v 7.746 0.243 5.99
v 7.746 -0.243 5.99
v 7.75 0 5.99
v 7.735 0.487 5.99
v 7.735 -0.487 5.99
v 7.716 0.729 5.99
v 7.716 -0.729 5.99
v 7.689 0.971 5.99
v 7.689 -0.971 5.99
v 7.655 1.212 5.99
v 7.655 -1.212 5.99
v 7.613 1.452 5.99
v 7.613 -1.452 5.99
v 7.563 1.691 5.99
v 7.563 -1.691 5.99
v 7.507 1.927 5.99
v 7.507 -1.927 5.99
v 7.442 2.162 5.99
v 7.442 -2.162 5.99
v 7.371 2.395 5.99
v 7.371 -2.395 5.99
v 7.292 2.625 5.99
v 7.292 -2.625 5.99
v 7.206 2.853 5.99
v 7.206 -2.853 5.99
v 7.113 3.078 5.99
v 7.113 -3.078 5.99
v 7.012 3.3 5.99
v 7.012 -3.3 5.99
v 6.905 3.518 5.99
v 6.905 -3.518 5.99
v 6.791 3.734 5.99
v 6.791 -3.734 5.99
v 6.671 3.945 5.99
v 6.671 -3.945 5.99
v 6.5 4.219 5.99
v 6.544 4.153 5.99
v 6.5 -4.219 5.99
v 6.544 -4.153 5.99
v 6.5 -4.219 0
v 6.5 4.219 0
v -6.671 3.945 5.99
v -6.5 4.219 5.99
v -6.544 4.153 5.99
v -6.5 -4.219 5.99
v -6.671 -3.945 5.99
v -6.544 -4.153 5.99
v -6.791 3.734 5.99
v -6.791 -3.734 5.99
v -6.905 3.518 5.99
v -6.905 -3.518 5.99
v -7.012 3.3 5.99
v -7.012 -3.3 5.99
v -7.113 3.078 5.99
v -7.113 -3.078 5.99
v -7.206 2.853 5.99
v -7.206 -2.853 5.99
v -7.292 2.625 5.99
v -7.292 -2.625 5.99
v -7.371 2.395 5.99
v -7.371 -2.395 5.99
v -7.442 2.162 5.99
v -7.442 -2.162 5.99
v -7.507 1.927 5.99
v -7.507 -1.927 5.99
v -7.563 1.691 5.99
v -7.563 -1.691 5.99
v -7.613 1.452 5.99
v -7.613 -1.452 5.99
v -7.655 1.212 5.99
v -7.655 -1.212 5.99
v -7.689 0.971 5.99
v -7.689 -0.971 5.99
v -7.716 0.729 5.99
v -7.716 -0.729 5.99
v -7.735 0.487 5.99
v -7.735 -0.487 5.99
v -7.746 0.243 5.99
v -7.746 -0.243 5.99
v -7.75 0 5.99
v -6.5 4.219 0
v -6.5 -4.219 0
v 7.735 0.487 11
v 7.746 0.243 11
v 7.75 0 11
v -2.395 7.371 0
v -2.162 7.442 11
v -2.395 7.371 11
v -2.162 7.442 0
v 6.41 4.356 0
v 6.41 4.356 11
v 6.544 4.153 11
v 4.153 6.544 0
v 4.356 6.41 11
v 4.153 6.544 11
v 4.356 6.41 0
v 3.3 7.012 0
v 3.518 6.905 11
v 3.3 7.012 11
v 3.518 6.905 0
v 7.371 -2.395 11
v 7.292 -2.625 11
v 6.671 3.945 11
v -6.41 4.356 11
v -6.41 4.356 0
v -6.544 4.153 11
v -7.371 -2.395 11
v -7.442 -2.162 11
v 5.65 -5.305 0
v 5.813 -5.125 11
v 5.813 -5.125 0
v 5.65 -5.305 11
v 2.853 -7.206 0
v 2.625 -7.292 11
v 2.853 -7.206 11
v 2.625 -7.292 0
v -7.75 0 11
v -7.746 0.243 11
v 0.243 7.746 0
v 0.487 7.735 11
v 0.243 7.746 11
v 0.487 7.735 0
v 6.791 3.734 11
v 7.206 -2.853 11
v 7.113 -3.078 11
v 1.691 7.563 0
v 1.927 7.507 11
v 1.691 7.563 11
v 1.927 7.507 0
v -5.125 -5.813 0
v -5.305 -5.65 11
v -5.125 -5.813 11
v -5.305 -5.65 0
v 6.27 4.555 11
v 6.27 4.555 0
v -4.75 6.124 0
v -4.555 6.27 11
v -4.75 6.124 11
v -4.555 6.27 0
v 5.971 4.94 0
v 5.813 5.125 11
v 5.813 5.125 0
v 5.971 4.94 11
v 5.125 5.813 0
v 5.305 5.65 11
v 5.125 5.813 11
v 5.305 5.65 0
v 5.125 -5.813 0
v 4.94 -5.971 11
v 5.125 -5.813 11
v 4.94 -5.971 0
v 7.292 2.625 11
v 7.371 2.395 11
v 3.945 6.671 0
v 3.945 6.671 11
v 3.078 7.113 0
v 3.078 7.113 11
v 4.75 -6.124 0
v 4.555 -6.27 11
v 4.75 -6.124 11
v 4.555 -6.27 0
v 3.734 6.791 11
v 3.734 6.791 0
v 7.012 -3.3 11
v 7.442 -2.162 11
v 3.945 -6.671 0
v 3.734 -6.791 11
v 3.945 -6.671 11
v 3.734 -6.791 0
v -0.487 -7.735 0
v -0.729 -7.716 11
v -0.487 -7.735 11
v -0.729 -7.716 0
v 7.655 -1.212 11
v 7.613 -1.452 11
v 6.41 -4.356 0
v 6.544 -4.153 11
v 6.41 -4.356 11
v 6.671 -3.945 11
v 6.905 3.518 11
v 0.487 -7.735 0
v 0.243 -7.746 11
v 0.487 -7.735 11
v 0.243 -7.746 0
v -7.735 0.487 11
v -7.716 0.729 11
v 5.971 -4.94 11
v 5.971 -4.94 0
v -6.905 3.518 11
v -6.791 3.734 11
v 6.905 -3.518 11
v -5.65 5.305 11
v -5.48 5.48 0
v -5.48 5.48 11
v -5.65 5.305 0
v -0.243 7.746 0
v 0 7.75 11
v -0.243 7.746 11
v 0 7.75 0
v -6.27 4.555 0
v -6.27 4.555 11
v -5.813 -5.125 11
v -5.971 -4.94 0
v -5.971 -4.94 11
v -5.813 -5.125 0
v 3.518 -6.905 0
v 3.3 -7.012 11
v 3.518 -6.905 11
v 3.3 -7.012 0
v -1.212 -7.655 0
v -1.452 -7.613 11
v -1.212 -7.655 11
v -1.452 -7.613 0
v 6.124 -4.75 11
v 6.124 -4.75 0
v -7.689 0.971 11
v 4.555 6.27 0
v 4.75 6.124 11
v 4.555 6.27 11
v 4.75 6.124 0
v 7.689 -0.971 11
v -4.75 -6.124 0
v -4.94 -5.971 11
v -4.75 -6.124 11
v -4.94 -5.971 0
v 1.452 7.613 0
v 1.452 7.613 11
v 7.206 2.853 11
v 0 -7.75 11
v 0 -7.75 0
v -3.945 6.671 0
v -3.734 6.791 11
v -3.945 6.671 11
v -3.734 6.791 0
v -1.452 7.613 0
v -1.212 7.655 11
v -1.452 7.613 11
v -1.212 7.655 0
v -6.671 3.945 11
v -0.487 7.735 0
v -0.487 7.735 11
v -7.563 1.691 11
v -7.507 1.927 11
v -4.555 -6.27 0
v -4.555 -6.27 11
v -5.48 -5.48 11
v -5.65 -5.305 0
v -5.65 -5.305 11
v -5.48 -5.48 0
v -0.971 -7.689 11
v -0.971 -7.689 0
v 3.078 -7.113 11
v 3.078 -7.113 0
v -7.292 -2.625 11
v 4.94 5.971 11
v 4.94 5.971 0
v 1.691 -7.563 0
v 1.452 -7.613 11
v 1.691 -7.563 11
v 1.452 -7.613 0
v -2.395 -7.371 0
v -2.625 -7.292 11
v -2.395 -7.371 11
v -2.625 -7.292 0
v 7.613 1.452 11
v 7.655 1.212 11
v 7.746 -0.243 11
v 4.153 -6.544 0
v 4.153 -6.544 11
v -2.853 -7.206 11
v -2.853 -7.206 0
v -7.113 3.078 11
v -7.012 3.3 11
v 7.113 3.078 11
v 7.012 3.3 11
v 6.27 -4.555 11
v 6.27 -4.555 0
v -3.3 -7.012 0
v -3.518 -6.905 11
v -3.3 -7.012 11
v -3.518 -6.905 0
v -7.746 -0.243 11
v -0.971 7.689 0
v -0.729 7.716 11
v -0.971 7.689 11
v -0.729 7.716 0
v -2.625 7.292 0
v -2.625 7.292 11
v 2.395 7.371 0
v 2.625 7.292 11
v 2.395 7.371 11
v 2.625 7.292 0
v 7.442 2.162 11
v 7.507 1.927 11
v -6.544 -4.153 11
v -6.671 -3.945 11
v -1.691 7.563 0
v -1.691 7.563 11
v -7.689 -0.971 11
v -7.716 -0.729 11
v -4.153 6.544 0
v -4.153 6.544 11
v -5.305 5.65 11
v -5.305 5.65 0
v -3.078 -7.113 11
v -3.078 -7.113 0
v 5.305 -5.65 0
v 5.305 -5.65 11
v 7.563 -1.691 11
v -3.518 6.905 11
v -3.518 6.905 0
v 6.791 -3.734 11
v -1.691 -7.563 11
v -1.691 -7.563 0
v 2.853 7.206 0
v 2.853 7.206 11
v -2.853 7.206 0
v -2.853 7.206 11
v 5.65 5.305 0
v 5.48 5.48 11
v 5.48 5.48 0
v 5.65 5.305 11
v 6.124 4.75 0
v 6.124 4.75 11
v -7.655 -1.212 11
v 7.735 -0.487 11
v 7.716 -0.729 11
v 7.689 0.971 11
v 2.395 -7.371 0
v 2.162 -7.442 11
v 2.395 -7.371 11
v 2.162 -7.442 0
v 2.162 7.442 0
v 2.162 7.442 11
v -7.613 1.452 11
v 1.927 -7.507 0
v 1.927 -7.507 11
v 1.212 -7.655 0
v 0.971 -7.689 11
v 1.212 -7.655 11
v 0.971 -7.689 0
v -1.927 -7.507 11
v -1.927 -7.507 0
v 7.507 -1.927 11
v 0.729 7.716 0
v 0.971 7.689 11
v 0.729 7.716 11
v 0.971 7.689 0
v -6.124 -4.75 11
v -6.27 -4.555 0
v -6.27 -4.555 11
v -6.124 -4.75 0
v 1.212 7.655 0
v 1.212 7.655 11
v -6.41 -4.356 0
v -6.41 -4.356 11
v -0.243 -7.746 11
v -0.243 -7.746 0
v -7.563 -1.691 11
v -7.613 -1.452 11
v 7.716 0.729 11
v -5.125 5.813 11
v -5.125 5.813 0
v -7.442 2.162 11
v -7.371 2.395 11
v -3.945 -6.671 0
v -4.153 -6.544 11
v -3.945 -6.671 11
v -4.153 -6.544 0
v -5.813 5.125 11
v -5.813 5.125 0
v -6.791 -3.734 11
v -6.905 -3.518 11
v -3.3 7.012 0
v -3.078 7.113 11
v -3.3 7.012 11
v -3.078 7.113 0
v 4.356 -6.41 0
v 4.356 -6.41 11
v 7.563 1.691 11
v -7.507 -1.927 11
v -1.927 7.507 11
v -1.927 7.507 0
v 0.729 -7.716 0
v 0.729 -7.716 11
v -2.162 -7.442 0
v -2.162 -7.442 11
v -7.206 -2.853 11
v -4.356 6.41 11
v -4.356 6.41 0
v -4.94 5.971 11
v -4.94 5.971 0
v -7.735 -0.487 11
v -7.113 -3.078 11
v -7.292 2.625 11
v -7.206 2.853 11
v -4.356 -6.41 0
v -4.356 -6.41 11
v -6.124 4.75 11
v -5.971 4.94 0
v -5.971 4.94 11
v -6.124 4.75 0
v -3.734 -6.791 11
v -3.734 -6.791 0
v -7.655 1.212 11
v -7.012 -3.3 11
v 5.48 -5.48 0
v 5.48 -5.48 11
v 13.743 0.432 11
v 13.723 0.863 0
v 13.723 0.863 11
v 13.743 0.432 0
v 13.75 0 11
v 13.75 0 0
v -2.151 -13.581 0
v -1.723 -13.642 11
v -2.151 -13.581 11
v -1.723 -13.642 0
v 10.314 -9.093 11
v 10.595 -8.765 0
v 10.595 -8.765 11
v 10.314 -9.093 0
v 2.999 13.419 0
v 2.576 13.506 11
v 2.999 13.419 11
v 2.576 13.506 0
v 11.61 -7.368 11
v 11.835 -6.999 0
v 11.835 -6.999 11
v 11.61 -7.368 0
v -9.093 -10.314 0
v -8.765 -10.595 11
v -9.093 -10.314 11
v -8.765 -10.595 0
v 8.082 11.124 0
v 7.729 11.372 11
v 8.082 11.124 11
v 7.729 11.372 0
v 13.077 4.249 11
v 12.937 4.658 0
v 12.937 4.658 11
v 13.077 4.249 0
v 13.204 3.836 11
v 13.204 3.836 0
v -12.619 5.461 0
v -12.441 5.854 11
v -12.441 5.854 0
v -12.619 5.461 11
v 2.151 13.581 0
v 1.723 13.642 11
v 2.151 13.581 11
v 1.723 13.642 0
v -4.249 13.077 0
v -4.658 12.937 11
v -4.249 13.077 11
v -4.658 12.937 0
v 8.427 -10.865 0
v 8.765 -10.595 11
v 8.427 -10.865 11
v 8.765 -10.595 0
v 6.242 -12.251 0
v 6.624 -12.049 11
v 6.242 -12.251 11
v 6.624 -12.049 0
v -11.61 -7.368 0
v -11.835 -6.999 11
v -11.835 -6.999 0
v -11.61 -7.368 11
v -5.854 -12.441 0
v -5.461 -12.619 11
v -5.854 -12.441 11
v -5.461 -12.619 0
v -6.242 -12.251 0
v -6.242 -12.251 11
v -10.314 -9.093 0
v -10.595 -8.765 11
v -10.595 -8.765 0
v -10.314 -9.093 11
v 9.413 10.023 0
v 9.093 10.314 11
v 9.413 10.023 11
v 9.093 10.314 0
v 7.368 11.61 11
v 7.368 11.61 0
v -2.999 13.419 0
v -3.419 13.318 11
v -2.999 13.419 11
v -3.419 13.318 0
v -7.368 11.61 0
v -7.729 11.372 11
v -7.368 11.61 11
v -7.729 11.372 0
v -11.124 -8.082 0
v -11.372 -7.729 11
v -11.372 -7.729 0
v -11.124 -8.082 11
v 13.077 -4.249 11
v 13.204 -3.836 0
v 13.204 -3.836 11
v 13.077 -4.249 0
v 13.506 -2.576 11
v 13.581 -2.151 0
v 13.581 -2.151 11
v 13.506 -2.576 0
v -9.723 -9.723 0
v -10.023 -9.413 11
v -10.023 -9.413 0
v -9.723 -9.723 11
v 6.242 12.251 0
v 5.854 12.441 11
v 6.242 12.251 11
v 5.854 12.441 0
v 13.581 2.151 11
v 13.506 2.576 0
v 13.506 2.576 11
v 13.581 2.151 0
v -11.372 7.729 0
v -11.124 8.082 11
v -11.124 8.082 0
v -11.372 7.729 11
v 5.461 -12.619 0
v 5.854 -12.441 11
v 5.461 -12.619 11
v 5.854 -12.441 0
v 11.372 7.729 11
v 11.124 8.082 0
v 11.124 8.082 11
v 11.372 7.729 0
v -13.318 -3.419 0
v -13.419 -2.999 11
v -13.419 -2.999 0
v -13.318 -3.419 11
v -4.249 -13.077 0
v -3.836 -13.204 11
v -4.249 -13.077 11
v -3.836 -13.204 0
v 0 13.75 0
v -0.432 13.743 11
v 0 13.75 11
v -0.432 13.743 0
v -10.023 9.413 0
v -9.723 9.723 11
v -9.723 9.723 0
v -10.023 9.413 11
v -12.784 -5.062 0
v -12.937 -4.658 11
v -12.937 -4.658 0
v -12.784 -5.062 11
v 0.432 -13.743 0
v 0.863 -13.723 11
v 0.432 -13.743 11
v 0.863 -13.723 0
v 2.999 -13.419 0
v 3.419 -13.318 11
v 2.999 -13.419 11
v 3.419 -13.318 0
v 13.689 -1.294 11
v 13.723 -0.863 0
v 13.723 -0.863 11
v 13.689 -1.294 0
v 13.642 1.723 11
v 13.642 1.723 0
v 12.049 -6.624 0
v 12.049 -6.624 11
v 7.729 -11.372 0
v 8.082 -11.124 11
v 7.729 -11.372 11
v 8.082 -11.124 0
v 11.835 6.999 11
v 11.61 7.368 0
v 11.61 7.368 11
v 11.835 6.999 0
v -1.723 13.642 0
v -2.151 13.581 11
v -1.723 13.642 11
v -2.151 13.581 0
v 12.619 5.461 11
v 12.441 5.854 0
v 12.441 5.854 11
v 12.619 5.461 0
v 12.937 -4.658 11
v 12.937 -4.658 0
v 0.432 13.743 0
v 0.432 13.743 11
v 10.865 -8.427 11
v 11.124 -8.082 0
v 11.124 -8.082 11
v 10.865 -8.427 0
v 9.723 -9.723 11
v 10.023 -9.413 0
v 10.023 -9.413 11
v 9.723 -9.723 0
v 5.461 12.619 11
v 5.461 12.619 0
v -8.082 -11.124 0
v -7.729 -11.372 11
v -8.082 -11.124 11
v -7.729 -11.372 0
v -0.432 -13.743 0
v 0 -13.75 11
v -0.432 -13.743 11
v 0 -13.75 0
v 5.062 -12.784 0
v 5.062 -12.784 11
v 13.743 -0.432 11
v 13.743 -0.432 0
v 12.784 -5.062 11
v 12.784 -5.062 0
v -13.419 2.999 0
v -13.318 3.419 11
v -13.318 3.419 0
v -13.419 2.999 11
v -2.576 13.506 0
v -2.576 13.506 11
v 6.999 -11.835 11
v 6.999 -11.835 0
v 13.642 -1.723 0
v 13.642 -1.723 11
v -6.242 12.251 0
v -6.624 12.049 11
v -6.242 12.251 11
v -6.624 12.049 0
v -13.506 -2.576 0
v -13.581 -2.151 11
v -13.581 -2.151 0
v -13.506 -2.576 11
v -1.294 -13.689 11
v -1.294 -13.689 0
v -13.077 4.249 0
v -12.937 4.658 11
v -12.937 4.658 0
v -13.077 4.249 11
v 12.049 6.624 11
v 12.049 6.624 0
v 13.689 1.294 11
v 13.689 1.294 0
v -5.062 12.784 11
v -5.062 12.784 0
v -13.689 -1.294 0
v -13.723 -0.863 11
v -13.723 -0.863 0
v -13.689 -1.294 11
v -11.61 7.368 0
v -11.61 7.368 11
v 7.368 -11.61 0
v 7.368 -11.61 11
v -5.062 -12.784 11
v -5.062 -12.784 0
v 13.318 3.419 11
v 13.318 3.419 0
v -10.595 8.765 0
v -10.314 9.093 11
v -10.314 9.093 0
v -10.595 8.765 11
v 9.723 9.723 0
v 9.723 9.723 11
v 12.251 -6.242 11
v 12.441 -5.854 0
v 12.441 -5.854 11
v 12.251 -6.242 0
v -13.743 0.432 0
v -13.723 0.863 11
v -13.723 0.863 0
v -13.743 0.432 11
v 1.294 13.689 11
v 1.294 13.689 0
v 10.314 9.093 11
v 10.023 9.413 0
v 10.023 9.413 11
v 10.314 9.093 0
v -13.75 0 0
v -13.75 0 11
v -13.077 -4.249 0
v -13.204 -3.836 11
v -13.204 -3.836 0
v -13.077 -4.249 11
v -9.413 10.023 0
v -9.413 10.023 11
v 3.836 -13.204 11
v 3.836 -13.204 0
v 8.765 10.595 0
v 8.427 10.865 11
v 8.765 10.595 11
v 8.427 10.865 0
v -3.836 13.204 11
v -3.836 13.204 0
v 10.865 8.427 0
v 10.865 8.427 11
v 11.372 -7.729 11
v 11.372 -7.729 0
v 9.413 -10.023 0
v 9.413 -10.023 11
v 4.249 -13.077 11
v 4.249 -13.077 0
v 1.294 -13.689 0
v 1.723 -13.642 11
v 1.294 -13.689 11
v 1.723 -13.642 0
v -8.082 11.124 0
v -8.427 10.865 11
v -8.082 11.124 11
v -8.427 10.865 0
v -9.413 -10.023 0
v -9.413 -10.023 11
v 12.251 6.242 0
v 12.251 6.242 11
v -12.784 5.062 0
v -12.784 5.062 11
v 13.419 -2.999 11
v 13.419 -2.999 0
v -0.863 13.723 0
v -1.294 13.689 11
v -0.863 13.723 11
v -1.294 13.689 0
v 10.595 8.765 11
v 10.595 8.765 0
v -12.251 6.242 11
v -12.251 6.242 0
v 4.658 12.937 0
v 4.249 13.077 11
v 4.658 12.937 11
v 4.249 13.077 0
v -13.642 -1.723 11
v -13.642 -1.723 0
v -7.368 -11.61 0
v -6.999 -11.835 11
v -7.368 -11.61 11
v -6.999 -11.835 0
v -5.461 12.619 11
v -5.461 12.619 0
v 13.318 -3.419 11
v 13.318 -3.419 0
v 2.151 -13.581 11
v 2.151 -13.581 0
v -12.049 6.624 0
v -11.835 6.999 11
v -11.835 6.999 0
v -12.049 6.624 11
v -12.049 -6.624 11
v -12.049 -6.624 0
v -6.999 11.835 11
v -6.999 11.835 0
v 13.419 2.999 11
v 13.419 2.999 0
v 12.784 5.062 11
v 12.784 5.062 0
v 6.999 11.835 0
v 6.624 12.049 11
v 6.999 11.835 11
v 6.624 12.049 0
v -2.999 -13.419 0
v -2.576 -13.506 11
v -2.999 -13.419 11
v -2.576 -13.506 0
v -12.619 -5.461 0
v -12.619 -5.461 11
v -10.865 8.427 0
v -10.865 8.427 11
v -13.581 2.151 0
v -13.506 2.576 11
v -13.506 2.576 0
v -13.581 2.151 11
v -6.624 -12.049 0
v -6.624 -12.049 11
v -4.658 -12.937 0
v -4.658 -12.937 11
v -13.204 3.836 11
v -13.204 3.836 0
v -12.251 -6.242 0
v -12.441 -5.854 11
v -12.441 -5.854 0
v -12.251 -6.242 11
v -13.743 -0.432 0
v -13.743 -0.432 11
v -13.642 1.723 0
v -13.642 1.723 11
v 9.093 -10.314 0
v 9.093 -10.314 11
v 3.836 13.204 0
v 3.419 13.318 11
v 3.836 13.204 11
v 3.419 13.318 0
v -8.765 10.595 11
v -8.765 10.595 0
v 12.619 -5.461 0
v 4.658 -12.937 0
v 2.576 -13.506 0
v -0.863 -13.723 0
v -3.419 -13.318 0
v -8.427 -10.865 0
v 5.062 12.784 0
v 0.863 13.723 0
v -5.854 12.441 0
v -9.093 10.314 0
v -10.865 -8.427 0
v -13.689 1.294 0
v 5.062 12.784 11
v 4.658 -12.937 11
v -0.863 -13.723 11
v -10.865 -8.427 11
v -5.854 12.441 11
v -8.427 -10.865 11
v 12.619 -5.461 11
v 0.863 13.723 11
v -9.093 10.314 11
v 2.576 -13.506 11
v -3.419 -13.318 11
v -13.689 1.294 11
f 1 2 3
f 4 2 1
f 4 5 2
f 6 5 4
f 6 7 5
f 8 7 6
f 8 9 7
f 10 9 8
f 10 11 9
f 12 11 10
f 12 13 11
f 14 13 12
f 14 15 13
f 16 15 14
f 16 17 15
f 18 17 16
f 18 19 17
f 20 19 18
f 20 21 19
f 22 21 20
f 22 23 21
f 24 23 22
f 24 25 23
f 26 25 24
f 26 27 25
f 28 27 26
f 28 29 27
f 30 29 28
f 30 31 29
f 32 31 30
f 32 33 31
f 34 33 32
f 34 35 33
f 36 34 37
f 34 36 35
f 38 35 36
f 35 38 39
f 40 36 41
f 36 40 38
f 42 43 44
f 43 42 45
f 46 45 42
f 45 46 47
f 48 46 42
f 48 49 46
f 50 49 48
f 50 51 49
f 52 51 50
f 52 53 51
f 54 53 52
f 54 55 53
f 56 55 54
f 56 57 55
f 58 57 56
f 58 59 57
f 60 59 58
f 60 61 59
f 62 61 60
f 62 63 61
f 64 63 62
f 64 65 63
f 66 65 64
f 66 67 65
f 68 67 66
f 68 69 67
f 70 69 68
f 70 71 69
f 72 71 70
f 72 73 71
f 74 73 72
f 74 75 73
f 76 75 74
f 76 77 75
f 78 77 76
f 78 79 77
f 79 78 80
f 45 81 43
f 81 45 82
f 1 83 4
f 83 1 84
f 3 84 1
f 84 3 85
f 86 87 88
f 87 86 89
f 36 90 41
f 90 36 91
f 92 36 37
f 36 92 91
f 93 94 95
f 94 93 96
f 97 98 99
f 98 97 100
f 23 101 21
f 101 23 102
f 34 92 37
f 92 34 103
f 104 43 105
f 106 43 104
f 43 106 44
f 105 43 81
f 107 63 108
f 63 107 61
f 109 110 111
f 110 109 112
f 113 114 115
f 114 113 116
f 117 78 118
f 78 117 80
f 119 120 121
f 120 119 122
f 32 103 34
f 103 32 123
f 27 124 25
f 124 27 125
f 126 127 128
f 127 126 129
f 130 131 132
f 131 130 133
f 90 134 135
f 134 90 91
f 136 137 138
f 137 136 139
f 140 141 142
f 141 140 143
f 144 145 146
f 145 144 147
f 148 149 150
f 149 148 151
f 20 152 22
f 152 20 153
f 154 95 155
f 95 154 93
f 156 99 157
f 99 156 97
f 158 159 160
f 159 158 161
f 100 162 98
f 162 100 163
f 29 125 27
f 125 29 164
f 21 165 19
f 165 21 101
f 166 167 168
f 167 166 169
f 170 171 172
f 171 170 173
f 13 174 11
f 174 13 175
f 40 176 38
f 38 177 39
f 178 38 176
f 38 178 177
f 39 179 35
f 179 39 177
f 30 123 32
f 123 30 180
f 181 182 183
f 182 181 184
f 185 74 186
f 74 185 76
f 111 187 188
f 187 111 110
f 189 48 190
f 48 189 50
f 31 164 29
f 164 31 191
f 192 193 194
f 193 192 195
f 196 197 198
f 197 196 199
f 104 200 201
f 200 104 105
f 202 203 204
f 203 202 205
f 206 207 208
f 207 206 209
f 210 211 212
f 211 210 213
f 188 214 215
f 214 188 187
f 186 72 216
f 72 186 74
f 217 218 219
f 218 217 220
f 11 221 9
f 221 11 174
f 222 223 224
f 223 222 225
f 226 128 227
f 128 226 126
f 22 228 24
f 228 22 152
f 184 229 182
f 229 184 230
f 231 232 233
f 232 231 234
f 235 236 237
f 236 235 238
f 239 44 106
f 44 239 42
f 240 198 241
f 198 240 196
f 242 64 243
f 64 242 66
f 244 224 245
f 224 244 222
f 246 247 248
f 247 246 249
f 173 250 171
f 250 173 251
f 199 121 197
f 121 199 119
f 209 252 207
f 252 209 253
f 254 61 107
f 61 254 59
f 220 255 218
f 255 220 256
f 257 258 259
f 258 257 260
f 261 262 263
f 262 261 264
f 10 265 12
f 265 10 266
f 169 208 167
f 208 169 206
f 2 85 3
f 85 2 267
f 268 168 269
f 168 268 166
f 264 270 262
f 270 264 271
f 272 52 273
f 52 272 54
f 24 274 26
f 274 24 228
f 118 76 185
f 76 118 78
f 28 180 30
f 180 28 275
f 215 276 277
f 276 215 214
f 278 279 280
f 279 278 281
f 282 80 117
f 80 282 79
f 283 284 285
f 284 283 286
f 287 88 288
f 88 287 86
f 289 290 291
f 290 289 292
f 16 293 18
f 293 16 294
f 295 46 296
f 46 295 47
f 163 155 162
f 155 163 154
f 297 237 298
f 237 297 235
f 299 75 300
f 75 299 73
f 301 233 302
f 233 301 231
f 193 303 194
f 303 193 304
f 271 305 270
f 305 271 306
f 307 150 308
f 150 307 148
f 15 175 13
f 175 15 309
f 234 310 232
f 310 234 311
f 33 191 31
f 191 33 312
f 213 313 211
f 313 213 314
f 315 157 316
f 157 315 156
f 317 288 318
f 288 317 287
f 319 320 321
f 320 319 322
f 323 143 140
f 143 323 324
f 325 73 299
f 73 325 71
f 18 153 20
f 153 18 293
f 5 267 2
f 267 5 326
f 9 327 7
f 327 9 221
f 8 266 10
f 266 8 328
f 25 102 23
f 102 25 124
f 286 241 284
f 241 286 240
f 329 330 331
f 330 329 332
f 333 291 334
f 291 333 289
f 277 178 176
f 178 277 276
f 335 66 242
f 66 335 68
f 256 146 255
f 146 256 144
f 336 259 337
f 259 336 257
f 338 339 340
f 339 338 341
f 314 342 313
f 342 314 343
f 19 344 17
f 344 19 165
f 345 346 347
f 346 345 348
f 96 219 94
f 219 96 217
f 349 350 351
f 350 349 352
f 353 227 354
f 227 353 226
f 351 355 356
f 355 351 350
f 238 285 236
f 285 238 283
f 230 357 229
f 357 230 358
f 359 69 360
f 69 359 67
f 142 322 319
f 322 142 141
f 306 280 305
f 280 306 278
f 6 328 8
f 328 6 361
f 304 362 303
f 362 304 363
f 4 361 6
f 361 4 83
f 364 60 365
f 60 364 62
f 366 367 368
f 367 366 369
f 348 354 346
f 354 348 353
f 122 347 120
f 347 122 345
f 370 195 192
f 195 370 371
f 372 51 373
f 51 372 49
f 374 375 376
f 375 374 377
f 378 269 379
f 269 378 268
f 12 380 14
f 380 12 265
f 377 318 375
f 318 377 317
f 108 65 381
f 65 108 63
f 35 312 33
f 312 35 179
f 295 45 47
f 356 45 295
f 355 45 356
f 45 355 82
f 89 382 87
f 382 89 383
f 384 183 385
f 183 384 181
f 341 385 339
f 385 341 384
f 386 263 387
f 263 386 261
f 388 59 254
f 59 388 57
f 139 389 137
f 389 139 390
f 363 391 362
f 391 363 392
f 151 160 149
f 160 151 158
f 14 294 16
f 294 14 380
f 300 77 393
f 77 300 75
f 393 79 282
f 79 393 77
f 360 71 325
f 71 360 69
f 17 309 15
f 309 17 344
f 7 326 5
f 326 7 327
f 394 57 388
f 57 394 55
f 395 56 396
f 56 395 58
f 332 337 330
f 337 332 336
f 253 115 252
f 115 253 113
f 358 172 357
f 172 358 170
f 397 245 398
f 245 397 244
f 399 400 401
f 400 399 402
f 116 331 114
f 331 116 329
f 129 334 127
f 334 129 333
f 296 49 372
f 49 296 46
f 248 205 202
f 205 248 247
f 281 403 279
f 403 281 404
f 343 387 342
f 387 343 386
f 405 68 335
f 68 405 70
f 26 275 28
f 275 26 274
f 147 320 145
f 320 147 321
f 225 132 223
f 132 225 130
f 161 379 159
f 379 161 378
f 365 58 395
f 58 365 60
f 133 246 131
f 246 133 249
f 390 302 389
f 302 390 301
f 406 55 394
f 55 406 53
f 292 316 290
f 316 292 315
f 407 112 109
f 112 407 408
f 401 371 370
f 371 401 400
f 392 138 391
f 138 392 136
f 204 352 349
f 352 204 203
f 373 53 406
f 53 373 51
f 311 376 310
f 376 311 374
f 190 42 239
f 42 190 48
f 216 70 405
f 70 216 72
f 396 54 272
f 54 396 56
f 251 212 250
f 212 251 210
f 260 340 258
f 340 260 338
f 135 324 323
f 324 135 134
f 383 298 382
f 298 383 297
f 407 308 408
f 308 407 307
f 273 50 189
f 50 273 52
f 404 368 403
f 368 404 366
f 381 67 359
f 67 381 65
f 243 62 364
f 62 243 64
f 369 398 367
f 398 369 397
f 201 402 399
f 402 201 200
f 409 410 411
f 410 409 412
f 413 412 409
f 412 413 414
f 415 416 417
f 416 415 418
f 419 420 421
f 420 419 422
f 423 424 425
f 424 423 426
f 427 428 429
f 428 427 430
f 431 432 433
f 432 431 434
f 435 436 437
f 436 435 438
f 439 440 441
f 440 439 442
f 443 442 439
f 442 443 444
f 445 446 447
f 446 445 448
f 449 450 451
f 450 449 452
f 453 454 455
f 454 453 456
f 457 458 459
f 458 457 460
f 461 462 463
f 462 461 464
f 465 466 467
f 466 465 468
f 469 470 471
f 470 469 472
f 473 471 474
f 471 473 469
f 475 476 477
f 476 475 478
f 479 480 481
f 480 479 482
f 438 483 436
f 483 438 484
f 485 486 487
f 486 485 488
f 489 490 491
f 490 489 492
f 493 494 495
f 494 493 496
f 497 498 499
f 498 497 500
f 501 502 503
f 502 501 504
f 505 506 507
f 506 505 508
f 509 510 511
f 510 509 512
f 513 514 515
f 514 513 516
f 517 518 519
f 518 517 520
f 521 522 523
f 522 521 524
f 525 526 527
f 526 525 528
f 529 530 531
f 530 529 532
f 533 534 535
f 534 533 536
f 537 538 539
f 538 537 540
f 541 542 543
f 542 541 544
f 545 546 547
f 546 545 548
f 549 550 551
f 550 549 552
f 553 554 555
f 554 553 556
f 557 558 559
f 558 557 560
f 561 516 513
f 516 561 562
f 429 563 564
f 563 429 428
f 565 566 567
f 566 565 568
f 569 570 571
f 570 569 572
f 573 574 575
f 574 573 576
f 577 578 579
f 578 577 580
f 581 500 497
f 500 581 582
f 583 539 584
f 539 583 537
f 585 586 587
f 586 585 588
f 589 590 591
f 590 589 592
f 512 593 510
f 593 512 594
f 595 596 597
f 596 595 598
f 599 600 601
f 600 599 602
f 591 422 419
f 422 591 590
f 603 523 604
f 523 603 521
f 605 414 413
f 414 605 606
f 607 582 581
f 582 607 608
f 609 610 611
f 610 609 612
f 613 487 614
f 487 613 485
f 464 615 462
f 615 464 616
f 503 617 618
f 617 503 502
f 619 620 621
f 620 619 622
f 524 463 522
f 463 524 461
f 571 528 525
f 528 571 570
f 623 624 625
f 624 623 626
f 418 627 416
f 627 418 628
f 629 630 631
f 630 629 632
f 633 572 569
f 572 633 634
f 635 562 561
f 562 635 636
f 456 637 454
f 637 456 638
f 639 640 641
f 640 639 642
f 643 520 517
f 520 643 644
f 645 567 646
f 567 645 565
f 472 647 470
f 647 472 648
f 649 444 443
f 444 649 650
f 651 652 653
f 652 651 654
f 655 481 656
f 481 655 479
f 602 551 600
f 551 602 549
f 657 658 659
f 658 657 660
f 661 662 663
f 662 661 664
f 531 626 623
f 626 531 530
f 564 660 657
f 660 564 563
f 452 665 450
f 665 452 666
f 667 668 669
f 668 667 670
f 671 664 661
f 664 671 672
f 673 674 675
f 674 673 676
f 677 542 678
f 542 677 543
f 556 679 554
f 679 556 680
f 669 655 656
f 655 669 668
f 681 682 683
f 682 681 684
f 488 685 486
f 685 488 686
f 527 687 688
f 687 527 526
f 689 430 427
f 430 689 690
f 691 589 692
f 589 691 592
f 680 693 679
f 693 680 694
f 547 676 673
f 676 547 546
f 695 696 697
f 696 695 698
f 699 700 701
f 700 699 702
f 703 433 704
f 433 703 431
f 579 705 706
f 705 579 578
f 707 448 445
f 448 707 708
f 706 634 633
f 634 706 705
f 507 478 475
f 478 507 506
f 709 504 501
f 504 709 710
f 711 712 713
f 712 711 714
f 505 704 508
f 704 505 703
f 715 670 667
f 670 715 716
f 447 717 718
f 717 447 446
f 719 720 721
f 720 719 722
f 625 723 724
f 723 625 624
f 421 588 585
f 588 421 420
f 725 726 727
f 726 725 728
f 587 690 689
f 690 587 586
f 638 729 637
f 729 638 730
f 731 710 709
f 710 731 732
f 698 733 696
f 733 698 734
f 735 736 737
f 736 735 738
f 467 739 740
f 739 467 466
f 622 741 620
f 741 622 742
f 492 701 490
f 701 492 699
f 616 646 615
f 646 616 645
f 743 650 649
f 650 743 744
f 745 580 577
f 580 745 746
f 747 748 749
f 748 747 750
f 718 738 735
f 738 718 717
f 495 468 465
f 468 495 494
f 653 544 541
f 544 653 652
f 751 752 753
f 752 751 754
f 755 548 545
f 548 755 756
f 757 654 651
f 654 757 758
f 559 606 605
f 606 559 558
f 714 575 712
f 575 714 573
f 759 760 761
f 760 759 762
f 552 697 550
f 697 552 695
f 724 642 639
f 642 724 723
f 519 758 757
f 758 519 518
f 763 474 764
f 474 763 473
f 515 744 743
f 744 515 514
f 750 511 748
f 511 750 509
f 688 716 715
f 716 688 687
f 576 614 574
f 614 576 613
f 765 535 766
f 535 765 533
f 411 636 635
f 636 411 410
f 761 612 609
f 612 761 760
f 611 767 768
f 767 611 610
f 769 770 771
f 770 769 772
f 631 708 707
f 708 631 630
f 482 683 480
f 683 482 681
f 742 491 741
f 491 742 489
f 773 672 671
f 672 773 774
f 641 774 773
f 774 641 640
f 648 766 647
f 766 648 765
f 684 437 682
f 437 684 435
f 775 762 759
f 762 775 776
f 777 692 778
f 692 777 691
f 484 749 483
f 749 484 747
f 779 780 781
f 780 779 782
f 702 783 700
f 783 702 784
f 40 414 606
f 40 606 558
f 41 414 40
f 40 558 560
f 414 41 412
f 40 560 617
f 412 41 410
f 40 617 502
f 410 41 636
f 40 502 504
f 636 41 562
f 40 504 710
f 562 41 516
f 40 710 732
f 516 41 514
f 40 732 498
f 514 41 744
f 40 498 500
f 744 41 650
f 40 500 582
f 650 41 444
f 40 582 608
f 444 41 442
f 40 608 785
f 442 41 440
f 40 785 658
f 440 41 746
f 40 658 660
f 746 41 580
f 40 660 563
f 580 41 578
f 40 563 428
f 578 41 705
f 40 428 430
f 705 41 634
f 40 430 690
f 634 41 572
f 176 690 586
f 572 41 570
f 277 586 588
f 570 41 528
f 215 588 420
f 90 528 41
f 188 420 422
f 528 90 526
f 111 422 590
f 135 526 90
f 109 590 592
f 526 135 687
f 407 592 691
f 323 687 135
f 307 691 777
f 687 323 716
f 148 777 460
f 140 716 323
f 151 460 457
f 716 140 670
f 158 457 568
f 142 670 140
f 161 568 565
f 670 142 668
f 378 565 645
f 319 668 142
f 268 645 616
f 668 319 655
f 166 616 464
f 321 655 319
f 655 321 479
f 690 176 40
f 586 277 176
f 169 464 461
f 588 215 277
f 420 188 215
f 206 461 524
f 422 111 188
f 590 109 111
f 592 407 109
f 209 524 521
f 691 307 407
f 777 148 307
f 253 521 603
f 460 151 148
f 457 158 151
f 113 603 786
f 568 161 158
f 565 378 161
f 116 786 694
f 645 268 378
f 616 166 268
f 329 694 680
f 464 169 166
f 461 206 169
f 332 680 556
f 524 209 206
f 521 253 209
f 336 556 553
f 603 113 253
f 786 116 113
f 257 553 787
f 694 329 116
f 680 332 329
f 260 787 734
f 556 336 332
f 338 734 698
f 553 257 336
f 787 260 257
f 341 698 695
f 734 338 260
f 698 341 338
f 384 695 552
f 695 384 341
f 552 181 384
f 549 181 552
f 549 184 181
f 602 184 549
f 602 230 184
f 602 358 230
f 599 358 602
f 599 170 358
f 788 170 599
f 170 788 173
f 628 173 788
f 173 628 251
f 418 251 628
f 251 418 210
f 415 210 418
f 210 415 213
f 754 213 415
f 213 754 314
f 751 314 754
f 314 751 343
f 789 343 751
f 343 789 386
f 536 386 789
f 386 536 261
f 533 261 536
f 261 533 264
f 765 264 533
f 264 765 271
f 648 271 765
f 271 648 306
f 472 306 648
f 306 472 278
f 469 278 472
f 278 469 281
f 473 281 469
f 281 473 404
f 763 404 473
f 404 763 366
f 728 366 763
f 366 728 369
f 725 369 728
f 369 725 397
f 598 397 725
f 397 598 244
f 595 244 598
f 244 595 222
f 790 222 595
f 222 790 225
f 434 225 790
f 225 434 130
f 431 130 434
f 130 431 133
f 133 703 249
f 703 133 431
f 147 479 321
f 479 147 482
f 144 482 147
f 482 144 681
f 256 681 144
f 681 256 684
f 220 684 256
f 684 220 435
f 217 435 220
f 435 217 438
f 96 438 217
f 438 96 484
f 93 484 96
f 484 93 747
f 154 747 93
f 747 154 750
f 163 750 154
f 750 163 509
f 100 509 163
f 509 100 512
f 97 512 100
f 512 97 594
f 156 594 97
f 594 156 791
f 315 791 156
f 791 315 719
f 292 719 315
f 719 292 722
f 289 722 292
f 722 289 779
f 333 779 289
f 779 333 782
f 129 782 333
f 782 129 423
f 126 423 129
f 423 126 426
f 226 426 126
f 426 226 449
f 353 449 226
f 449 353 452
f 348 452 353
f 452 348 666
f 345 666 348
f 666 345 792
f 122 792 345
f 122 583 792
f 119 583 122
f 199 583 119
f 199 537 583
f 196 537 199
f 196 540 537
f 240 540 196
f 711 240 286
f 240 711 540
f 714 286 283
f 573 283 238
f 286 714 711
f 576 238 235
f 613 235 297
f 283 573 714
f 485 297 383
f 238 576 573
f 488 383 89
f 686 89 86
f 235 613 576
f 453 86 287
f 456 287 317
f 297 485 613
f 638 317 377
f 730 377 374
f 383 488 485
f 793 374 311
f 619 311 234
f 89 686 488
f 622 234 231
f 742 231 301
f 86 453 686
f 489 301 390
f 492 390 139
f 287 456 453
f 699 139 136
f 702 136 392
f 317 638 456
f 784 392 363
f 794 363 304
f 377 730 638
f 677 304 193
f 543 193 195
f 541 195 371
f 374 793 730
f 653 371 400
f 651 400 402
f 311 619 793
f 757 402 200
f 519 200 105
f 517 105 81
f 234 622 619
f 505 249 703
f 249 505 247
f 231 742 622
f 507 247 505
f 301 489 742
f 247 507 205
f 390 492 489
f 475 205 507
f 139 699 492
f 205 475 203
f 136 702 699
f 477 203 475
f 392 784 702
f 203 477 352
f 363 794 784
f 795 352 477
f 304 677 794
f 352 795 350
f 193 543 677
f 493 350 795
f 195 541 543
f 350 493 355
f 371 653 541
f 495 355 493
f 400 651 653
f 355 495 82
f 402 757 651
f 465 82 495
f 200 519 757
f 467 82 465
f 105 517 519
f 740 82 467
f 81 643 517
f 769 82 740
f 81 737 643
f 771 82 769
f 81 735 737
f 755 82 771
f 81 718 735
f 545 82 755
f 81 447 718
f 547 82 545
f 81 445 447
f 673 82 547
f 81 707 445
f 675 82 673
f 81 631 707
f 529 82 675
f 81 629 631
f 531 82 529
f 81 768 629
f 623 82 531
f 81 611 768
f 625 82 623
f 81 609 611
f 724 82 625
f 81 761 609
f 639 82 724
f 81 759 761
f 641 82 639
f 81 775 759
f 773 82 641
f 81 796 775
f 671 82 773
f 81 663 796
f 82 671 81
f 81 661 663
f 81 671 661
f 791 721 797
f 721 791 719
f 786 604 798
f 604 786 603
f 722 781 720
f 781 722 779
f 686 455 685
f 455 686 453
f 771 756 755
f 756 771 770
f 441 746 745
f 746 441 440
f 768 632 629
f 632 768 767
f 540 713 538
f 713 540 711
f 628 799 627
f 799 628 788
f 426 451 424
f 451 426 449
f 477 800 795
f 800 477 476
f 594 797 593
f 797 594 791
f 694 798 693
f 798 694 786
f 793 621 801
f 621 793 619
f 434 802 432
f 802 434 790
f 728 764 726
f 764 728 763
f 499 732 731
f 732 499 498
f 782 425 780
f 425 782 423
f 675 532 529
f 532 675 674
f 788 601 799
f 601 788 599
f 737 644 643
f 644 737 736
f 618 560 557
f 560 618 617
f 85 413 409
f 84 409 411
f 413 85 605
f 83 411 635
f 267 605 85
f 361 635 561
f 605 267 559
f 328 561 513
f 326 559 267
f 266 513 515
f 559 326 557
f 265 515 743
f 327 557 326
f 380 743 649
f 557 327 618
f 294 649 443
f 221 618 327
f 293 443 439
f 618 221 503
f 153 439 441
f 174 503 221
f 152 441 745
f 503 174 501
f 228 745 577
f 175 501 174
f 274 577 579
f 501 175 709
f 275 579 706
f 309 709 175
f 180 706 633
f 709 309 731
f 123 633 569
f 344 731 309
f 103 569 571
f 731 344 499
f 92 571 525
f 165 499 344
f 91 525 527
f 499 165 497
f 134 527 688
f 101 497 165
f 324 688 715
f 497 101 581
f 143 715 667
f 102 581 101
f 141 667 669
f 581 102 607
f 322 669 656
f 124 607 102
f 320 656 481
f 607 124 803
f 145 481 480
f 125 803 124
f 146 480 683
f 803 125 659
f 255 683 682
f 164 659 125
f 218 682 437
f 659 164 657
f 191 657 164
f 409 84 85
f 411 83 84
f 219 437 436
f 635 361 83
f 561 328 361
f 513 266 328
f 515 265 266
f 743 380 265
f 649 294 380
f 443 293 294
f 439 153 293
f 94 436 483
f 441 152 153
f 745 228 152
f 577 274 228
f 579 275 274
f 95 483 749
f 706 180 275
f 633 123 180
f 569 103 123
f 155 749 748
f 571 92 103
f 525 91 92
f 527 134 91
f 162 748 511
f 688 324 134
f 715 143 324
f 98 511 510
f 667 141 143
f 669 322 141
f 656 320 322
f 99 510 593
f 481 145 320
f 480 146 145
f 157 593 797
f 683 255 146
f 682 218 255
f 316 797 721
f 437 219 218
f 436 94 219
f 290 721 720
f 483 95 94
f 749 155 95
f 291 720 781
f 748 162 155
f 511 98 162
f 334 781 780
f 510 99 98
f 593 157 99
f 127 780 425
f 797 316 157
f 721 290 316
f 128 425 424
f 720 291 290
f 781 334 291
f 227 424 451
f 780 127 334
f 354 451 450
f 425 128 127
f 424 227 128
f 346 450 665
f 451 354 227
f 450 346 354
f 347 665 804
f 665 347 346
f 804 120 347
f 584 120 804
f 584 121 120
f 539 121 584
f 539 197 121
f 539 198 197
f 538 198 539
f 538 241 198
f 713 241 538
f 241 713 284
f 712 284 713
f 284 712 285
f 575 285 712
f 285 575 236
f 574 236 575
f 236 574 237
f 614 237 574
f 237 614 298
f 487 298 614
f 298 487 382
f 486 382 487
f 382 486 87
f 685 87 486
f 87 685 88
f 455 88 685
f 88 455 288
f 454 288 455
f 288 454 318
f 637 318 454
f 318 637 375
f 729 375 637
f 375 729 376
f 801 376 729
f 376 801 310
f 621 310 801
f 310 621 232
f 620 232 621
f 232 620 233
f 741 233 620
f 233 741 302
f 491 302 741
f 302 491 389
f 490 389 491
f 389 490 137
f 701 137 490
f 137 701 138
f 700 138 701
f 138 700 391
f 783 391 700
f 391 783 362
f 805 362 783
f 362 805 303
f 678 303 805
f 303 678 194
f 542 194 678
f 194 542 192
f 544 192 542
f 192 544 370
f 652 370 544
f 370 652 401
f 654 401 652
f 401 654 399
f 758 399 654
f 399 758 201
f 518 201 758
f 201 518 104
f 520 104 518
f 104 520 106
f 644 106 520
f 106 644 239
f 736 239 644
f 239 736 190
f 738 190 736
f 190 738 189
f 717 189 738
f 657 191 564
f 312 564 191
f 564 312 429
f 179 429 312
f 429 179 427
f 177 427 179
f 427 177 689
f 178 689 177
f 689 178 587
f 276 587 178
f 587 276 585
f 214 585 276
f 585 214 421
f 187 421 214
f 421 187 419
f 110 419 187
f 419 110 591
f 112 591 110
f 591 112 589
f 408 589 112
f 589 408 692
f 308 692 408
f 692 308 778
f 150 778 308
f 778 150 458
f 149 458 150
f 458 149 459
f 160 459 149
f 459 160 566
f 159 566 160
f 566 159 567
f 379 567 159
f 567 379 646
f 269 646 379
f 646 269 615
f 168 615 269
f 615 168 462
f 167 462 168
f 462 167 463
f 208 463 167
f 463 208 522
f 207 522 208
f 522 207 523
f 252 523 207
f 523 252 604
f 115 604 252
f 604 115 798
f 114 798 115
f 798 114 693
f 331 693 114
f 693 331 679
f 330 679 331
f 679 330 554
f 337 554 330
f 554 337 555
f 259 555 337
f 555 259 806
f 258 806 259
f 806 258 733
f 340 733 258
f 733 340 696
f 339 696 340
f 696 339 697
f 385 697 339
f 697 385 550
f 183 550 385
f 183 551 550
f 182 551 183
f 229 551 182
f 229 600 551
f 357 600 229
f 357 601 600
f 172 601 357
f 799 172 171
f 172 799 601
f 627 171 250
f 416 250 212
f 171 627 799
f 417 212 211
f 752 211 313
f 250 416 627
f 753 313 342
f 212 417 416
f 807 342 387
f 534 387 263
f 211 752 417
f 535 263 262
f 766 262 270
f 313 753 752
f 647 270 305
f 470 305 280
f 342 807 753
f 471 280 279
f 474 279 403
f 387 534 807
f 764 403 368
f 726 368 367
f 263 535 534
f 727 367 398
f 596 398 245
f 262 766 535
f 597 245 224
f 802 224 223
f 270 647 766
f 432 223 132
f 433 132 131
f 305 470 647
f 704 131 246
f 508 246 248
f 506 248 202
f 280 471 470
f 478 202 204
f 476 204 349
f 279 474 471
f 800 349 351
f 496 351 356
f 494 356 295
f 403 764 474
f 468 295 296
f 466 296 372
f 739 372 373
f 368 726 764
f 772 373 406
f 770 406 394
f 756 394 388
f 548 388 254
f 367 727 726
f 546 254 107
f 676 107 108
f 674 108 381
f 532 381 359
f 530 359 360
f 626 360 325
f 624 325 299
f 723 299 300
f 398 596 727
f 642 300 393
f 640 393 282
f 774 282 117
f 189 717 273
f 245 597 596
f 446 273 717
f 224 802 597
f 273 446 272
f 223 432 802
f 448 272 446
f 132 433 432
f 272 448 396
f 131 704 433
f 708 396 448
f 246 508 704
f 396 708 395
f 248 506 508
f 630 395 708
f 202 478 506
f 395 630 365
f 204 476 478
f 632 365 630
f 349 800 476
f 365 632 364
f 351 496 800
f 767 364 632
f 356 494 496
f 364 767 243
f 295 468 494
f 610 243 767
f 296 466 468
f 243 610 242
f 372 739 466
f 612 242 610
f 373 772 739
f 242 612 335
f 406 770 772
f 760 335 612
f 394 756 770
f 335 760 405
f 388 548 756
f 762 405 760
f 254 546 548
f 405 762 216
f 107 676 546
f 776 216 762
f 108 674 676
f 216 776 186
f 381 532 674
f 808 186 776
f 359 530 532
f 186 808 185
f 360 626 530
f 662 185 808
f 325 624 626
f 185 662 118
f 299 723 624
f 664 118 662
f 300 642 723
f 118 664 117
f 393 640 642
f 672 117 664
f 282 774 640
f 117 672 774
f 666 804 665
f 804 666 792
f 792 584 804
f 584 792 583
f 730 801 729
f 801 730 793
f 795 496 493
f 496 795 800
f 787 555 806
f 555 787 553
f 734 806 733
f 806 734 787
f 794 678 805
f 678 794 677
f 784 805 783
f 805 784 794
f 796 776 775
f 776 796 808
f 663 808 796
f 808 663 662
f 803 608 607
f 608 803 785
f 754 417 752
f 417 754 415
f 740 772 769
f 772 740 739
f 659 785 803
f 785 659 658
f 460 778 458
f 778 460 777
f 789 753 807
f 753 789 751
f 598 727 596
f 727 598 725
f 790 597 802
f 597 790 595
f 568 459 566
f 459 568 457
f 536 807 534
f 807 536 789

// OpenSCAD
$fn = 200;

eps = 0.01;
bigSize = 100;



rOuter = 27.5/2;
rInner = 15.5/2;
w = 13.0;
h = 11.0;
h2 = 6.0;



module drawJHead()
{
	difference()
	{
		union()
		{
			cylinder(h+2*eps,rInner, rInner);
		}
		union()
		{
			translate([w/2,-bigSize/2,-eps]) cube([bigSize,bigSize,h2+eps]);
			mirror([1,0,0]) translate([w/2,-bigSize/2,-eps]) cube([bigSize,bigSize,h2+eps]);
		}
	}
}


module drawGasket() 
{
	difference()
	{
		union()
		{
			cylinder(h,rOuter, rOuter);
		}
		union()
		{
			translate([0,0,-eps]) drawJHead();
		}
	}
}



// tests
//drawJHead();


// parts
drawGasket();
